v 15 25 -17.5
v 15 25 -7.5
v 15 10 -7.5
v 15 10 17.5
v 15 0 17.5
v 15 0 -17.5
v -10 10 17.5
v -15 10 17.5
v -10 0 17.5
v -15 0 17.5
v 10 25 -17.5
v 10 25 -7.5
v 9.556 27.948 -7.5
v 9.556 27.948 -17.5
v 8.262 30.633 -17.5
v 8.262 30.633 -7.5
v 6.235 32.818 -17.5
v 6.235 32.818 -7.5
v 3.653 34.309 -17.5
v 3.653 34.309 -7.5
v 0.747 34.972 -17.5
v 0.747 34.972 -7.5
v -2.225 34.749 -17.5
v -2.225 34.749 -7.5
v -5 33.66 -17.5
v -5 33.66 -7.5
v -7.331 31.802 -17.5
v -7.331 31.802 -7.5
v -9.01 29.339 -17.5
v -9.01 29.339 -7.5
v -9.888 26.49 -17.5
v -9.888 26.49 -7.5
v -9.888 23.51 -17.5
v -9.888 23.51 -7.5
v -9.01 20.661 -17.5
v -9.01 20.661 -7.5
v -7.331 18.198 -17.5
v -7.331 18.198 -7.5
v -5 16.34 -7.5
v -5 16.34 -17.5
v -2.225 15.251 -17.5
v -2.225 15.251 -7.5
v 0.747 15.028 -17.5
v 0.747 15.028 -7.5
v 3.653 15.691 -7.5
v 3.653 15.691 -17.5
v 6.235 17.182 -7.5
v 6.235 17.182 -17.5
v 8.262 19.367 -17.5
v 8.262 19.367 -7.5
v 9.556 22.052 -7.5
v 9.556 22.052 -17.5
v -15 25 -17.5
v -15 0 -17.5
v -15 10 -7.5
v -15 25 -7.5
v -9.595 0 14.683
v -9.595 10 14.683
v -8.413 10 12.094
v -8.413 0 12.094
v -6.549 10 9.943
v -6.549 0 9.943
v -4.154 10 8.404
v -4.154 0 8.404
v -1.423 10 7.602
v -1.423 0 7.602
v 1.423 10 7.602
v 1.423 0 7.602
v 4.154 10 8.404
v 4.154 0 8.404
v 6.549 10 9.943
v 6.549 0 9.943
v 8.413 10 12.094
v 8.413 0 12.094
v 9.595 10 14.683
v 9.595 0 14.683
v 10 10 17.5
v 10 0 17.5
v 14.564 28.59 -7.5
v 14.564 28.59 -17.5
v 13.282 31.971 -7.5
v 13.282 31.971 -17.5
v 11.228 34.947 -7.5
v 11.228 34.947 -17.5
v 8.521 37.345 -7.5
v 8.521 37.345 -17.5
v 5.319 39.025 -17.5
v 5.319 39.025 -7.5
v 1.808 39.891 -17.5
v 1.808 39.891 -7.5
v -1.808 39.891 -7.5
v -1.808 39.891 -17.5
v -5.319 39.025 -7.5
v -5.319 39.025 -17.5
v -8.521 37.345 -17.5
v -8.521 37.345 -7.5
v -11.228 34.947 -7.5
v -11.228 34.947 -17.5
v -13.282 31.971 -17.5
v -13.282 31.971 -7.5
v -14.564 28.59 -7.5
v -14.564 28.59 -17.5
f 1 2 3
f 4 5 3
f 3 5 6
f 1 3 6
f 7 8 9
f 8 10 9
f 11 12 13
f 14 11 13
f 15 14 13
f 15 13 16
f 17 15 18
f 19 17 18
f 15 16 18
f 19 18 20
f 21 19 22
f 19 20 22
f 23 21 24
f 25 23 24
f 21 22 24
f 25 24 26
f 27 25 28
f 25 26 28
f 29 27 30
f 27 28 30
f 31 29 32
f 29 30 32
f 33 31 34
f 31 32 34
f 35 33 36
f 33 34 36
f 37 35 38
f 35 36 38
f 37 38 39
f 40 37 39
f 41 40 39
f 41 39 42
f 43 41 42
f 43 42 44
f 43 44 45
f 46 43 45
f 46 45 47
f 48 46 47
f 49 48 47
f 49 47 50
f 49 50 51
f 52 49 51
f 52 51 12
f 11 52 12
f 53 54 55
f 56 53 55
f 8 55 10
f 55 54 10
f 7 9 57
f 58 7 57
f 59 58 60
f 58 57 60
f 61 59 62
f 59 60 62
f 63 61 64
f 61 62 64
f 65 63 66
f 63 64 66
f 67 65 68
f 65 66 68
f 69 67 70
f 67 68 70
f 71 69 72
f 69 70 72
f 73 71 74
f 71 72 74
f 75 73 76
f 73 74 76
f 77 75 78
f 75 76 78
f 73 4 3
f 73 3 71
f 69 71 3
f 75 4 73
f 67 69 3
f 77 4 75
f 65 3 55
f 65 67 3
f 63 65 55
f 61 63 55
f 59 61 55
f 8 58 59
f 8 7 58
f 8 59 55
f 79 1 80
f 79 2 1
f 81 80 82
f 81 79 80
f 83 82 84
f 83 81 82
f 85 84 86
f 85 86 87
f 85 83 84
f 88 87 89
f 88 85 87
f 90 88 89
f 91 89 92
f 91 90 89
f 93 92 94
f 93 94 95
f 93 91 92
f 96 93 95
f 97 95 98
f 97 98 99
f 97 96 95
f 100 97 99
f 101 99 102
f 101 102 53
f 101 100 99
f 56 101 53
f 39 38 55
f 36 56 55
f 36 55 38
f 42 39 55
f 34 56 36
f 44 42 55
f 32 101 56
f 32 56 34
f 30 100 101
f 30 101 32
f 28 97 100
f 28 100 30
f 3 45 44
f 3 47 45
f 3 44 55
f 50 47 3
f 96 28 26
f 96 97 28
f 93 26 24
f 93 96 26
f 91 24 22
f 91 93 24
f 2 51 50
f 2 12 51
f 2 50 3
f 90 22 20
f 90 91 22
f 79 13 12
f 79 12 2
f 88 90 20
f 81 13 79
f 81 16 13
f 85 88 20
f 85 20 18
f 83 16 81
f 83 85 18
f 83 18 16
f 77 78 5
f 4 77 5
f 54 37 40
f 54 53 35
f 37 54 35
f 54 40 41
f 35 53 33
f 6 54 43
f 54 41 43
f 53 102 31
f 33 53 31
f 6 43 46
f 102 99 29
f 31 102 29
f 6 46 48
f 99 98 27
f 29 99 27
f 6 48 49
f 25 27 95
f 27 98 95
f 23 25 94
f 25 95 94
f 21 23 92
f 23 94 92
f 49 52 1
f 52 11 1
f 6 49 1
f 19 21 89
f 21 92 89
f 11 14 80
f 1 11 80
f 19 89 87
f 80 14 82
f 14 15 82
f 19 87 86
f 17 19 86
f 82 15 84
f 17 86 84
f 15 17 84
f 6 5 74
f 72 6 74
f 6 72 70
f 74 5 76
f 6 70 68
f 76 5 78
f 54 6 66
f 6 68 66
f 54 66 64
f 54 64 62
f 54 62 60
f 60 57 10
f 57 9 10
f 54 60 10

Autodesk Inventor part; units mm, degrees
ref_plane "YZ Plane" through (0, 0, 0) normal (1, 0, 0) x (0, 1, 0)
ref_plane "XZ Plane" through (0, 0, 0) normal (0, 1, 0) x (-1, 0, 0)
ref_plane "XY Plane" through (0, 0, 0) normal (0, 0, 1) x (1, 0, 0)
sketch "Sketch1" plane through (0, 0, 0) normal (0, 1, 0) x (-1, 0, 0)
  line L0 (15, 17.5) -> (-15, 17.5)
  line L1 (-15, 17.5) -> (-15, -17.5)
  line L2 (-15, -17.5) -> (15, -17.5)
  line L3 (15, -17.5) -> (15, 17.5)
  line L4 (15, 17.5) -> (-15, -17.5) construction
  line L5 (-15, 17.5) -> (15, -17.5) construction
  arc A0 (-10, 17.5) -> (10, 17.5) centre (0, 17.5) ccw
  point P0 (0, 0)
  dimension "d0" = 30
  dimension "d1" = 35
  dimension "d2" = 20
extrude "Extrusion1" add sketch "Sketch1" along normal blind 10 contours L3 L2 L1 L0 A0
sketch "Sketch2" plane through (0, 10, 0) normal (0, 1, 0) x (1, 0, 0)
  line L0 (15, 17.5) -> (-15, 17.5) projected
  line L1 (15, 17.5) -> (-15, 17.5)
  line L2 (-15, 17.5) -> (-15, 7.5)
  line L3 (-15, 7.5) -> (15, 7.5)
  line L4 (15, 7.5) -> (15, 17.5)
  point P0 (0, 0)
  dimension "d5" = 30
  dimension "d6" = 10
extrude "Extrusion2" add sketch "Sketch2" along normal blind 15
sketch "Sketch3" plane through (-15, 10, -7.5) normal (0, 0, 1) x (1, 0, 0)
  line L0 (0, 15) -> (30, 15) projected
  arc A0 (30, 15) -> (0, 15) centre (15, 15) ccw
  point P0 (15, -10)
extrude "Extrusion3" add sketch "Sketch3" against normal blind 10
sketch "Sketch4" plane through (-15, 10, -7.5) normal (0, 0, 1) x (1, 0, 0)
  arc A0 (30, 15) -> (0, 15) centre (15, 15) ccw projected
  circle A1 centre (15, 15) radius 10
  point P0 (15, -10)
  dimension "d12" = 20
extrude "Extrusion4" cut sketch "Sketch4" against normal blind 10
properties part number "atividade"
